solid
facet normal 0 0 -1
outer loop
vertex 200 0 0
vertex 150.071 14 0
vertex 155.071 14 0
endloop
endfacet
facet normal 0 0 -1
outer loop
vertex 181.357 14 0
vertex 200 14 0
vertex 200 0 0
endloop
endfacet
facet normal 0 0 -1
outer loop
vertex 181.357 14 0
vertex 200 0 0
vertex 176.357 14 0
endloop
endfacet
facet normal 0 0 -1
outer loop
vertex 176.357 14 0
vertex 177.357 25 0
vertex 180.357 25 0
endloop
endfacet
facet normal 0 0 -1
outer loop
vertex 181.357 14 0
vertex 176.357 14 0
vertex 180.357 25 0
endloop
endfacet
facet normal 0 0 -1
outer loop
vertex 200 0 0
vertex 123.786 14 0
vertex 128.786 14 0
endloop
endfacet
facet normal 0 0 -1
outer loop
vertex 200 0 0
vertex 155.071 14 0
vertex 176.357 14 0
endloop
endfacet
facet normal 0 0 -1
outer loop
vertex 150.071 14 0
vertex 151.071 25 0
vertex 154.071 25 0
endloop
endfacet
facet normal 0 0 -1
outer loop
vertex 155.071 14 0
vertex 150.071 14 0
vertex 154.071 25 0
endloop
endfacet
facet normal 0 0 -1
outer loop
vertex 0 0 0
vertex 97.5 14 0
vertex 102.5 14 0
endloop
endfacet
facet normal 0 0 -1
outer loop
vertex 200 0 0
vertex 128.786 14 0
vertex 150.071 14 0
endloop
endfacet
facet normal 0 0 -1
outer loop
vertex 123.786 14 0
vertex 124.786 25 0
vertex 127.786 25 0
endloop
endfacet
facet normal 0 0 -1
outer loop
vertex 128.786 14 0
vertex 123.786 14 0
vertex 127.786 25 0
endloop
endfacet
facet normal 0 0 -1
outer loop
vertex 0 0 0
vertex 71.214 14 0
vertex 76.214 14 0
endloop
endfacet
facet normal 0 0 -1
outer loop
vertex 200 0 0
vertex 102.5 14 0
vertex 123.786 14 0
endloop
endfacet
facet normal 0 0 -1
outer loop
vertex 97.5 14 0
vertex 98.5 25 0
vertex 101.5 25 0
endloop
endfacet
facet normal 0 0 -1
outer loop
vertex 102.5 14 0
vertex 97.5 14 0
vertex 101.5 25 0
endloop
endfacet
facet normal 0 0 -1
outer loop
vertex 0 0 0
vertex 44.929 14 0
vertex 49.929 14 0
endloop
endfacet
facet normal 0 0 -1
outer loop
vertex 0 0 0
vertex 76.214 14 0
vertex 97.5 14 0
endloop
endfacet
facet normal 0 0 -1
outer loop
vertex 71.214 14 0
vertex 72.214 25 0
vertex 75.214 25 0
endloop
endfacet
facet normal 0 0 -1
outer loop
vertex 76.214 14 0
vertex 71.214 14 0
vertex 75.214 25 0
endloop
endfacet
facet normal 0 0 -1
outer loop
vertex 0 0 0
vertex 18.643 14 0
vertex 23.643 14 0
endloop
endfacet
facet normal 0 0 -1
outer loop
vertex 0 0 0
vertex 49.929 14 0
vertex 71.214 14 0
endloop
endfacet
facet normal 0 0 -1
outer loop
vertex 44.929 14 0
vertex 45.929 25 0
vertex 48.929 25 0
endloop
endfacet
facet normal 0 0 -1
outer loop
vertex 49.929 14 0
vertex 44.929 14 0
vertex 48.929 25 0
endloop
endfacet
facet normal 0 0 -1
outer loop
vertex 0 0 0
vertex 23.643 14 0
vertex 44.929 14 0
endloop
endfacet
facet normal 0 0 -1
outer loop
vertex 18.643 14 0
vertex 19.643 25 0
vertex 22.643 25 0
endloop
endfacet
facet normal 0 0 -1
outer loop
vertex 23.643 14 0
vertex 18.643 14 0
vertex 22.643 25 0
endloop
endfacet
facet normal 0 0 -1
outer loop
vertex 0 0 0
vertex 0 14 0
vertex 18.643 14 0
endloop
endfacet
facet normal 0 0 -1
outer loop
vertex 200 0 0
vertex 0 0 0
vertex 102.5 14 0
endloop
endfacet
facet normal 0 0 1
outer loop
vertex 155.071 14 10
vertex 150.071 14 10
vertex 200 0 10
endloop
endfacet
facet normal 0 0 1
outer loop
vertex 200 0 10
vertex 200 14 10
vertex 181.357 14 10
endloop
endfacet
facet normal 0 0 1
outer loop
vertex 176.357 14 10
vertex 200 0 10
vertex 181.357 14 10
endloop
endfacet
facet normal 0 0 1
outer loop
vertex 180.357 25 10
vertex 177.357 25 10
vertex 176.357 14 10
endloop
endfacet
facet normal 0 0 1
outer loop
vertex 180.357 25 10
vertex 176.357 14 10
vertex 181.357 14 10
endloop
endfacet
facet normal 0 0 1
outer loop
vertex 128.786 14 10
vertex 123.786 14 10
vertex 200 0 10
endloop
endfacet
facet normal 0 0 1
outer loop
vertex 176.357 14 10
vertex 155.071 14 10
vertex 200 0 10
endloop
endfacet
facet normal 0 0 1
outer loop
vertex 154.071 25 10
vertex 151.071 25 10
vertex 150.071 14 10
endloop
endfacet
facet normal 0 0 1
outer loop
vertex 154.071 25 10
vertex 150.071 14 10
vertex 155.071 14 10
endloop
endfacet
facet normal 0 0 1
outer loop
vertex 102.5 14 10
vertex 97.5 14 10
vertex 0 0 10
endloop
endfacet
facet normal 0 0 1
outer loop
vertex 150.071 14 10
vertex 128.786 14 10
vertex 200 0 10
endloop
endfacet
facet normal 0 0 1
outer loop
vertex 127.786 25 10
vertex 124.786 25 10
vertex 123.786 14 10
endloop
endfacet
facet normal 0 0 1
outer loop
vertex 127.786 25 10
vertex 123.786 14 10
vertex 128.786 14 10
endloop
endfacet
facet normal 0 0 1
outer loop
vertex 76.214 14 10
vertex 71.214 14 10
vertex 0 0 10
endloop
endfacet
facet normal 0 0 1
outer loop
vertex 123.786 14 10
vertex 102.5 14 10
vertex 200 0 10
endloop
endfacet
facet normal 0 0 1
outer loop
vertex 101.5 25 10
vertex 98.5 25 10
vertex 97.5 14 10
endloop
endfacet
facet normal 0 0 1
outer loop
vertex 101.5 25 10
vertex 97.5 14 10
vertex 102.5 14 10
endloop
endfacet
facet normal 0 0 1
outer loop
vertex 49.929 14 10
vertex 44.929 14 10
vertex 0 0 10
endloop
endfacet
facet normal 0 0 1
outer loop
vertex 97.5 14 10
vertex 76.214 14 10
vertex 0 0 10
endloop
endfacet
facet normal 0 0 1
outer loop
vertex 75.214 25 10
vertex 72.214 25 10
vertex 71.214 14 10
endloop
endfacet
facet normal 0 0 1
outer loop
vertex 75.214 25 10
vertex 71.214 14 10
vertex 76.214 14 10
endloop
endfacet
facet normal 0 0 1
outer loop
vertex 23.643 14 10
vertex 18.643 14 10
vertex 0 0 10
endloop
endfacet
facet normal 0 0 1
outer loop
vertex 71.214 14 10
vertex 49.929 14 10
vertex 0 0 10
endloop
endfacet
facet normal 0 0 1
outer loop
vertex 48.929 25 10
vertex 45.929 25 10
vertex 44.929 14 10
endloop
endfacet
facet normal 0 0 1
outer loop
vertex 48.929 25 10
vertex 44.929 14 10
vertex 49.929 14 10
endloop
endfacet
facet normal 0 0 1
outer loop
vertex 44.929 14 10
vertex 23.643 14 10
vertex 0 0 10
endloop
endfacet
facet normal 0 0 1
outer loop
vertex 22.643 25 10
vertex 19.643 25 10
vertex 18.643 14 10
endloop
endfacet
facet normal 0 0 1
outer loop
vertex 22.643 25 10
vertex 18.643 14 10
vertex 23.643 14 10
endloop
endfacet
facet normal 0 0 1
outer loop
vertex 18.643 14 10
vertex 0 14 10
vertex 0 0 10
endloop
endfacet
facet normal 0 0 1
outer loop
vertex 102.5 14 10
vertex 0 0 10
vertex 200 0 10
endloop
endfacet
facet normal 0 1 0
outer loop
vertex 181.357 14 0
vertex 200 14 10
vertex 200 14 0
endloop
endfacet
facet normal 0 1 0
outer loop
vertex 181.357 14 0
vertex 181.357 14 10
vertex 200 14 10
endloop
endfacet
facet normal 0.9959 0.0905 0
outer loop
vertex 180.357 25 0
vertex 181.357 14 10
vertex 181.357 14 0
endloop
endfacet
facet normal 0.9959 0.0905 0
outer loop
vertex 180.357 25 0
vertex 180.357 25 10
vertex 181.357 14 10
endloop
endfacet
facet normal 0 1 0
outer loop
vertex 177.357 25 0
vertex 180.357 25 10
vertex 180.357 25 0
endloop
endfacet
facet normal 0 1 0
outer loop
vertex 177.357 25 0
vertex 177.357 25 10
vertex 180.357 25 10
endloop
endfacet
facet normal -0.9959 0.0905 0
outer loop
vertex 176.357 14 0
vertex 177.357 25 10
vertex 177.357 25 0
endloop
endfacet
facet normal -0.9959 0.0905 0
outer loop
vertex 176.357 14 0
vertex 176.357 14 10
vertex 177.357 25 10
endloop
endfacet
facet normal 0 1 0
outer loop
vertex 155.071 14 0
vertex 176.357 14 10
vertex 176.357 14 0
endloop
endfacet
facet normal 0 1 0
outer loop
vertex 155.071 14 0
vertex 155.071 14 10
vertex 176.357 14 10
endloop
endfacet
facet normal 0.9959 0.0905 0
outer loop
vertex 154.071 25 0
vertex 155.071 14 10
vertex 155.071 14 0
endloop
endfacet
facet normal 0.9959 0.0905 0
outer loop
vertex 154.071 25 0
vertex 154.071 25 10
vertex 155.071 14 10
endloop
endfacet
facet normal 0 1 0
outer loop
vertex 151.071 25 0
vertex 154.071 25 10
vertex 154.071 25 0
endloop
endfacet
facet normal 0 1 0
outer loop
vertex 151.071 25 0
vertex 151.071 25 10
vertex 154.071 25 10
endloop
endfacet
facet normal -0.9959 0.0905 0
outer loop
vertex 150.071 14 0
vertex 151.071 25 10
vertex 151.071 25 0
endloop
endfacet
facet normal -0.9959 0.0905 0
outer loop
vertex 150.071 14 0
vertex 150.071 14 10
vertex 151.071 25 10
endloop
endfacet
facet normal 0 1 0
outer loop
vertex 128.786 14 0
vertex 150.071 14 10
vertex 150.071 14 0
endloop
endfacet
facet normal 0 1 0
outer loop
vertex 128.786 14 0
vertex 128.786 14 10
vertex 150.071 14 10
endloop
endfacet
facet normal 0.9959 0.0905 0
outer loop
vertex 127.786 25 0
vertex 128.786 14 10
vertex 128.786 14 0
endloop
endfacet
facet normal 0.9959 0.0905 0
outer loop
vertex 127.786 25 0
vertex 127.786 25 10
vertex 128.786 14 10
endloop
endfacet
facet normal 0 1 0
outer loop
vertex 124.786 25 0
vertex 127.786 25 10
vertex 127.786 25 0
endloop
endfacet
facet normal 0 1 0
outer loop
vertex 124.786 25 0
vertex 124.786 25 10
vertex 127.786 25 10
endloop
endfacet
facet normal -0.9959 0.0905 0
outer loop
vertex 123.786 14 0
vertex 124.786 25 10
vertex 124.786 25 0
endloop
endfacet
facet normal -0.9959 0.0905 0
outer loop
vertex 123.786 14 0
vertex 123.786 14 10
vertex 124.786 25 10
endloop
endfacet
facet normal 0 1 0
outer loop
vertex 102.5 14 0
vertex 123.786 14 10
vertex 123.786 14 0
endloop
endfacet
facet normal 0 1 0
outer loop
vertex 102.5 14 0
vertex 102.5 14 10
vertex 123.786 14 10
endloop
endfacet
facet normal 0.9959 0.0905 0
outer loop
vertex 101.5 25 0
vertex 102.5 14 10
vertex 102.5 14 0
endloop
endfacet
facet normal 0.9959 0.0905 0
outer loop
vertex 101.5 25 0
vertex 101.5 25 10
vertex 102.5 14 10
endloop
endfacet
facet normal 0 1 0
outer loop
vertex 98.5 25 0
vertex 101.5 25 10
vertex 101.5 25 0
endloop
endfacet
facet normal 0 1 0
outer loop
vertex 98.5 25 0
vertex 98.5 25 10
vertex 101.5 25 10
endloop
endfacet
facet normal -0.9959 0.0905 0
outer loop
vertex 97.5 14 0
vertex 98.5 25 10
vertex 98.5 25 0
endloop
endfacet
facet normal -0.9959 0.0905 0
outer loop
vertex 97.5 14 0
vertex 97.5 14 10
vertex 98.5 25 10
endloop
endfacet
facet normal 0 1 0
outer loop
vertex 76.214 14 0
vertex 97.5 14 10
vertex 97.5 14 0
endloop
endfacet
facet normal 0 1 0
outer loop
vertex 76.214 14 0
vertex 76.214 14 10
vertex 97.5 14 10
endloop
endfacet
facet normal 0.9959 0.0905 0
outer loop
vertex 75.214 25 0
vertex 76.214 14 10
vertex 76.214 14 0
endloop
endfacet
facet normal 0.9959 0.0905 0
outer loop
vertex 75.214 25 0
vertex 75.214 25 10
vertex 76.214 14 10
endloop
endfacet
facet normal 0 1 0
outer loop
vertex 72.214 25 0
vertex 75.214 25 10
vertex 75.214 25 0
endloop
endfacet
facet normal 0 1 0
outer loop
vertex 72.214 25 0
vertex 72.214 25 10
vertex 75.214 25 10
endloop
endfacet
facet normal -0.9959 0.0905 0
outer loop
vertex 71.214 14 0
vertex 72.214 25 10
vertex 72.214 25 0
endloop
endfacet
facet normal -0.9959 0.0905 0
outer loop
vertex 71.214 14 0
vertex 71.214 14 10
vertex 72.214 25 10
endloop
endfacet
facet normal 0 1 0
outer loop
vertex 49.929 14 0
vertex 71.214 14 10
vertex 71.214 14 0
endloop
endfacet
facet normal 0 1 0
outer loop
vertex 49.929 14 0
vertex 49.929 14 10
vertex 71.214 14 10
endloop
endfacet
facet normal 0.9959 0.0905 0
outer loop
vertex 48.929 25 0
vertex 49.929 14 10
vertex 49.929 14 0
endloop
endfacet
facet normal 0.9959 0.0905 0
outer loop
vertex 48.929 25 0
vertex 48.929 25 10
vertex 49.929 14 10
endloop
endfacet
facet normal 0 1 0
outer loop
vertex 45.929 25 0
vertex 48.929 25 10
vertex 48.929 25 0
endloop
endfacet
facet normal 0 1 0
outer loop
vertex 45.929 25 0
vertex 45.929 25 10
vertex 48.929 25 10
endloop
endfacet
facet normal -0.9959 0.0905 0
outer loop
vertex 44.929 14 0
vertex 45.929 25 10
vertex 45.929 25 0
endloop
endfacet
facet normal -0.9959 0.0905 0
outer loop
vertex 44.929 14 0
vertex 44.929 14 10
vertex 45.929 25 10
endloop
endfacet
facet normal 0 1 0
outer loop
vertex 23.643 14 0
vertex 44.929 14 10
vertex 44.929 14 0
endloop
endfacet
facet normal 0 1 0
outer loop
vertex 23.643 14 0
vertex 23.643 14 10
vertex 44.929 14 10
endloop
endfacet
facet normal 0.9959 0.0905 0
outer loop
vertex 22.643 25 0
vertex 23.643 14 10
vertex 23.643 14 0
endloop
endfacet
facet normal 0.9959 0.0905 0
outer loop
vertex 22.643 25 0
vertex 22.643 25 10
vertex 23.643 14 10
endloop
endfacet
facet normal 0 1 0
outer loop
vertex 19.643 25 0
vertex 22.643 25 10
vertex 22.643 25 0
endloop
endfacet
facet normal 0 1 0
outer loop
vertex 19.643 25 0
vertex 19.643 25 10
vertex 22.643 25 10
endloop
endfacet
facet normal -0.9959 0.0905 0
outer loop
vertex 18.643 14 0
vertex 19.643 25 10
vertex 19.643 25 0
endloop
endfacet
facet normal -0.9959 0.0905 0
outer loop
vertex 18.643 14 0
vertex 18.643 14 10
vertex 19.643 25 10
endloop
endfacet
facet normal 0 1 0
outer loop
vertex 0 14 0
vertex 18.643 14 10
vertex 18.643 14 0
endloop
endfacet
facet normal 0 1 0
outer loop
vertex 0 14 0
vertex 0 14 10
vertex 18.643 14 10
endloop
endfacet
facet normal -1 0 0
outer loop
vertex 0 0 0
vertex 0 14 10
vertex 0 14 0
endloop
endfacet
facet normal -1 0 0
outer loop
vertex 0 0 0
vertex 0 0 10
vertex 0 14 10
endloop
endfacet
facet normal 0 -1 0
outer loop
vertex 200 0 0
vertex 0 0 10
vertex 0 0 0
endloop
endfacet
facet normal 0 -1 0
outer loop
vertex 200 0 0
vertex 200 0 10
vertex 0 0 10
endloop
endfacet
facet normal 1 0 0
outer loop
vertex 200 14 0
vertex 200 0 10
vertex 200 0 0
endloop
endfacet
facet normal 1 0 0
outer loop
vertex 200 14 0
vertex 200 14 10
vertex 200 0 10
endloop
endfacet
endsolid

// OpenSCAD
$fn = 32;

// ----------------------------------------------------------------------
// Gear rack: 7 teeth on a 200 mm bar, pitch 26.29 mm
// ----------------------------------------------------------------------

// --- parameters (mm) ---
profile_height = 10;      // extrusion height
profile_points = 32;      // points of the closed outline

profile = [[0, 0], [200, 0], [200, 14], [181.357, 14], [180.357, 25], [177.357, 25], [176.357, 14], [155.071, 14], [154.071, 25], [151.071, 25], [150.071, 14], [128.786, 14], [127.786, 25], [124.786, 25], [123.786, 14], [102.5, 14], [101.5, 25], [98.5, 25], [97.5, 14], [76.214, 14], [75.214, 25], [72.214, 25], [71.214, 14], [49.929, 14], [48.929, 25], [45.929, 25], [44.929, 14], [23.643, 14], [22.643, 25], [19.643, 25], [18.643, 14], [0, 14]];  // single closed polygon, 32 points, counter clockwise

// --- the one profile operation ---
linear_extrude(height = profile_height) polygon(points = profile);
